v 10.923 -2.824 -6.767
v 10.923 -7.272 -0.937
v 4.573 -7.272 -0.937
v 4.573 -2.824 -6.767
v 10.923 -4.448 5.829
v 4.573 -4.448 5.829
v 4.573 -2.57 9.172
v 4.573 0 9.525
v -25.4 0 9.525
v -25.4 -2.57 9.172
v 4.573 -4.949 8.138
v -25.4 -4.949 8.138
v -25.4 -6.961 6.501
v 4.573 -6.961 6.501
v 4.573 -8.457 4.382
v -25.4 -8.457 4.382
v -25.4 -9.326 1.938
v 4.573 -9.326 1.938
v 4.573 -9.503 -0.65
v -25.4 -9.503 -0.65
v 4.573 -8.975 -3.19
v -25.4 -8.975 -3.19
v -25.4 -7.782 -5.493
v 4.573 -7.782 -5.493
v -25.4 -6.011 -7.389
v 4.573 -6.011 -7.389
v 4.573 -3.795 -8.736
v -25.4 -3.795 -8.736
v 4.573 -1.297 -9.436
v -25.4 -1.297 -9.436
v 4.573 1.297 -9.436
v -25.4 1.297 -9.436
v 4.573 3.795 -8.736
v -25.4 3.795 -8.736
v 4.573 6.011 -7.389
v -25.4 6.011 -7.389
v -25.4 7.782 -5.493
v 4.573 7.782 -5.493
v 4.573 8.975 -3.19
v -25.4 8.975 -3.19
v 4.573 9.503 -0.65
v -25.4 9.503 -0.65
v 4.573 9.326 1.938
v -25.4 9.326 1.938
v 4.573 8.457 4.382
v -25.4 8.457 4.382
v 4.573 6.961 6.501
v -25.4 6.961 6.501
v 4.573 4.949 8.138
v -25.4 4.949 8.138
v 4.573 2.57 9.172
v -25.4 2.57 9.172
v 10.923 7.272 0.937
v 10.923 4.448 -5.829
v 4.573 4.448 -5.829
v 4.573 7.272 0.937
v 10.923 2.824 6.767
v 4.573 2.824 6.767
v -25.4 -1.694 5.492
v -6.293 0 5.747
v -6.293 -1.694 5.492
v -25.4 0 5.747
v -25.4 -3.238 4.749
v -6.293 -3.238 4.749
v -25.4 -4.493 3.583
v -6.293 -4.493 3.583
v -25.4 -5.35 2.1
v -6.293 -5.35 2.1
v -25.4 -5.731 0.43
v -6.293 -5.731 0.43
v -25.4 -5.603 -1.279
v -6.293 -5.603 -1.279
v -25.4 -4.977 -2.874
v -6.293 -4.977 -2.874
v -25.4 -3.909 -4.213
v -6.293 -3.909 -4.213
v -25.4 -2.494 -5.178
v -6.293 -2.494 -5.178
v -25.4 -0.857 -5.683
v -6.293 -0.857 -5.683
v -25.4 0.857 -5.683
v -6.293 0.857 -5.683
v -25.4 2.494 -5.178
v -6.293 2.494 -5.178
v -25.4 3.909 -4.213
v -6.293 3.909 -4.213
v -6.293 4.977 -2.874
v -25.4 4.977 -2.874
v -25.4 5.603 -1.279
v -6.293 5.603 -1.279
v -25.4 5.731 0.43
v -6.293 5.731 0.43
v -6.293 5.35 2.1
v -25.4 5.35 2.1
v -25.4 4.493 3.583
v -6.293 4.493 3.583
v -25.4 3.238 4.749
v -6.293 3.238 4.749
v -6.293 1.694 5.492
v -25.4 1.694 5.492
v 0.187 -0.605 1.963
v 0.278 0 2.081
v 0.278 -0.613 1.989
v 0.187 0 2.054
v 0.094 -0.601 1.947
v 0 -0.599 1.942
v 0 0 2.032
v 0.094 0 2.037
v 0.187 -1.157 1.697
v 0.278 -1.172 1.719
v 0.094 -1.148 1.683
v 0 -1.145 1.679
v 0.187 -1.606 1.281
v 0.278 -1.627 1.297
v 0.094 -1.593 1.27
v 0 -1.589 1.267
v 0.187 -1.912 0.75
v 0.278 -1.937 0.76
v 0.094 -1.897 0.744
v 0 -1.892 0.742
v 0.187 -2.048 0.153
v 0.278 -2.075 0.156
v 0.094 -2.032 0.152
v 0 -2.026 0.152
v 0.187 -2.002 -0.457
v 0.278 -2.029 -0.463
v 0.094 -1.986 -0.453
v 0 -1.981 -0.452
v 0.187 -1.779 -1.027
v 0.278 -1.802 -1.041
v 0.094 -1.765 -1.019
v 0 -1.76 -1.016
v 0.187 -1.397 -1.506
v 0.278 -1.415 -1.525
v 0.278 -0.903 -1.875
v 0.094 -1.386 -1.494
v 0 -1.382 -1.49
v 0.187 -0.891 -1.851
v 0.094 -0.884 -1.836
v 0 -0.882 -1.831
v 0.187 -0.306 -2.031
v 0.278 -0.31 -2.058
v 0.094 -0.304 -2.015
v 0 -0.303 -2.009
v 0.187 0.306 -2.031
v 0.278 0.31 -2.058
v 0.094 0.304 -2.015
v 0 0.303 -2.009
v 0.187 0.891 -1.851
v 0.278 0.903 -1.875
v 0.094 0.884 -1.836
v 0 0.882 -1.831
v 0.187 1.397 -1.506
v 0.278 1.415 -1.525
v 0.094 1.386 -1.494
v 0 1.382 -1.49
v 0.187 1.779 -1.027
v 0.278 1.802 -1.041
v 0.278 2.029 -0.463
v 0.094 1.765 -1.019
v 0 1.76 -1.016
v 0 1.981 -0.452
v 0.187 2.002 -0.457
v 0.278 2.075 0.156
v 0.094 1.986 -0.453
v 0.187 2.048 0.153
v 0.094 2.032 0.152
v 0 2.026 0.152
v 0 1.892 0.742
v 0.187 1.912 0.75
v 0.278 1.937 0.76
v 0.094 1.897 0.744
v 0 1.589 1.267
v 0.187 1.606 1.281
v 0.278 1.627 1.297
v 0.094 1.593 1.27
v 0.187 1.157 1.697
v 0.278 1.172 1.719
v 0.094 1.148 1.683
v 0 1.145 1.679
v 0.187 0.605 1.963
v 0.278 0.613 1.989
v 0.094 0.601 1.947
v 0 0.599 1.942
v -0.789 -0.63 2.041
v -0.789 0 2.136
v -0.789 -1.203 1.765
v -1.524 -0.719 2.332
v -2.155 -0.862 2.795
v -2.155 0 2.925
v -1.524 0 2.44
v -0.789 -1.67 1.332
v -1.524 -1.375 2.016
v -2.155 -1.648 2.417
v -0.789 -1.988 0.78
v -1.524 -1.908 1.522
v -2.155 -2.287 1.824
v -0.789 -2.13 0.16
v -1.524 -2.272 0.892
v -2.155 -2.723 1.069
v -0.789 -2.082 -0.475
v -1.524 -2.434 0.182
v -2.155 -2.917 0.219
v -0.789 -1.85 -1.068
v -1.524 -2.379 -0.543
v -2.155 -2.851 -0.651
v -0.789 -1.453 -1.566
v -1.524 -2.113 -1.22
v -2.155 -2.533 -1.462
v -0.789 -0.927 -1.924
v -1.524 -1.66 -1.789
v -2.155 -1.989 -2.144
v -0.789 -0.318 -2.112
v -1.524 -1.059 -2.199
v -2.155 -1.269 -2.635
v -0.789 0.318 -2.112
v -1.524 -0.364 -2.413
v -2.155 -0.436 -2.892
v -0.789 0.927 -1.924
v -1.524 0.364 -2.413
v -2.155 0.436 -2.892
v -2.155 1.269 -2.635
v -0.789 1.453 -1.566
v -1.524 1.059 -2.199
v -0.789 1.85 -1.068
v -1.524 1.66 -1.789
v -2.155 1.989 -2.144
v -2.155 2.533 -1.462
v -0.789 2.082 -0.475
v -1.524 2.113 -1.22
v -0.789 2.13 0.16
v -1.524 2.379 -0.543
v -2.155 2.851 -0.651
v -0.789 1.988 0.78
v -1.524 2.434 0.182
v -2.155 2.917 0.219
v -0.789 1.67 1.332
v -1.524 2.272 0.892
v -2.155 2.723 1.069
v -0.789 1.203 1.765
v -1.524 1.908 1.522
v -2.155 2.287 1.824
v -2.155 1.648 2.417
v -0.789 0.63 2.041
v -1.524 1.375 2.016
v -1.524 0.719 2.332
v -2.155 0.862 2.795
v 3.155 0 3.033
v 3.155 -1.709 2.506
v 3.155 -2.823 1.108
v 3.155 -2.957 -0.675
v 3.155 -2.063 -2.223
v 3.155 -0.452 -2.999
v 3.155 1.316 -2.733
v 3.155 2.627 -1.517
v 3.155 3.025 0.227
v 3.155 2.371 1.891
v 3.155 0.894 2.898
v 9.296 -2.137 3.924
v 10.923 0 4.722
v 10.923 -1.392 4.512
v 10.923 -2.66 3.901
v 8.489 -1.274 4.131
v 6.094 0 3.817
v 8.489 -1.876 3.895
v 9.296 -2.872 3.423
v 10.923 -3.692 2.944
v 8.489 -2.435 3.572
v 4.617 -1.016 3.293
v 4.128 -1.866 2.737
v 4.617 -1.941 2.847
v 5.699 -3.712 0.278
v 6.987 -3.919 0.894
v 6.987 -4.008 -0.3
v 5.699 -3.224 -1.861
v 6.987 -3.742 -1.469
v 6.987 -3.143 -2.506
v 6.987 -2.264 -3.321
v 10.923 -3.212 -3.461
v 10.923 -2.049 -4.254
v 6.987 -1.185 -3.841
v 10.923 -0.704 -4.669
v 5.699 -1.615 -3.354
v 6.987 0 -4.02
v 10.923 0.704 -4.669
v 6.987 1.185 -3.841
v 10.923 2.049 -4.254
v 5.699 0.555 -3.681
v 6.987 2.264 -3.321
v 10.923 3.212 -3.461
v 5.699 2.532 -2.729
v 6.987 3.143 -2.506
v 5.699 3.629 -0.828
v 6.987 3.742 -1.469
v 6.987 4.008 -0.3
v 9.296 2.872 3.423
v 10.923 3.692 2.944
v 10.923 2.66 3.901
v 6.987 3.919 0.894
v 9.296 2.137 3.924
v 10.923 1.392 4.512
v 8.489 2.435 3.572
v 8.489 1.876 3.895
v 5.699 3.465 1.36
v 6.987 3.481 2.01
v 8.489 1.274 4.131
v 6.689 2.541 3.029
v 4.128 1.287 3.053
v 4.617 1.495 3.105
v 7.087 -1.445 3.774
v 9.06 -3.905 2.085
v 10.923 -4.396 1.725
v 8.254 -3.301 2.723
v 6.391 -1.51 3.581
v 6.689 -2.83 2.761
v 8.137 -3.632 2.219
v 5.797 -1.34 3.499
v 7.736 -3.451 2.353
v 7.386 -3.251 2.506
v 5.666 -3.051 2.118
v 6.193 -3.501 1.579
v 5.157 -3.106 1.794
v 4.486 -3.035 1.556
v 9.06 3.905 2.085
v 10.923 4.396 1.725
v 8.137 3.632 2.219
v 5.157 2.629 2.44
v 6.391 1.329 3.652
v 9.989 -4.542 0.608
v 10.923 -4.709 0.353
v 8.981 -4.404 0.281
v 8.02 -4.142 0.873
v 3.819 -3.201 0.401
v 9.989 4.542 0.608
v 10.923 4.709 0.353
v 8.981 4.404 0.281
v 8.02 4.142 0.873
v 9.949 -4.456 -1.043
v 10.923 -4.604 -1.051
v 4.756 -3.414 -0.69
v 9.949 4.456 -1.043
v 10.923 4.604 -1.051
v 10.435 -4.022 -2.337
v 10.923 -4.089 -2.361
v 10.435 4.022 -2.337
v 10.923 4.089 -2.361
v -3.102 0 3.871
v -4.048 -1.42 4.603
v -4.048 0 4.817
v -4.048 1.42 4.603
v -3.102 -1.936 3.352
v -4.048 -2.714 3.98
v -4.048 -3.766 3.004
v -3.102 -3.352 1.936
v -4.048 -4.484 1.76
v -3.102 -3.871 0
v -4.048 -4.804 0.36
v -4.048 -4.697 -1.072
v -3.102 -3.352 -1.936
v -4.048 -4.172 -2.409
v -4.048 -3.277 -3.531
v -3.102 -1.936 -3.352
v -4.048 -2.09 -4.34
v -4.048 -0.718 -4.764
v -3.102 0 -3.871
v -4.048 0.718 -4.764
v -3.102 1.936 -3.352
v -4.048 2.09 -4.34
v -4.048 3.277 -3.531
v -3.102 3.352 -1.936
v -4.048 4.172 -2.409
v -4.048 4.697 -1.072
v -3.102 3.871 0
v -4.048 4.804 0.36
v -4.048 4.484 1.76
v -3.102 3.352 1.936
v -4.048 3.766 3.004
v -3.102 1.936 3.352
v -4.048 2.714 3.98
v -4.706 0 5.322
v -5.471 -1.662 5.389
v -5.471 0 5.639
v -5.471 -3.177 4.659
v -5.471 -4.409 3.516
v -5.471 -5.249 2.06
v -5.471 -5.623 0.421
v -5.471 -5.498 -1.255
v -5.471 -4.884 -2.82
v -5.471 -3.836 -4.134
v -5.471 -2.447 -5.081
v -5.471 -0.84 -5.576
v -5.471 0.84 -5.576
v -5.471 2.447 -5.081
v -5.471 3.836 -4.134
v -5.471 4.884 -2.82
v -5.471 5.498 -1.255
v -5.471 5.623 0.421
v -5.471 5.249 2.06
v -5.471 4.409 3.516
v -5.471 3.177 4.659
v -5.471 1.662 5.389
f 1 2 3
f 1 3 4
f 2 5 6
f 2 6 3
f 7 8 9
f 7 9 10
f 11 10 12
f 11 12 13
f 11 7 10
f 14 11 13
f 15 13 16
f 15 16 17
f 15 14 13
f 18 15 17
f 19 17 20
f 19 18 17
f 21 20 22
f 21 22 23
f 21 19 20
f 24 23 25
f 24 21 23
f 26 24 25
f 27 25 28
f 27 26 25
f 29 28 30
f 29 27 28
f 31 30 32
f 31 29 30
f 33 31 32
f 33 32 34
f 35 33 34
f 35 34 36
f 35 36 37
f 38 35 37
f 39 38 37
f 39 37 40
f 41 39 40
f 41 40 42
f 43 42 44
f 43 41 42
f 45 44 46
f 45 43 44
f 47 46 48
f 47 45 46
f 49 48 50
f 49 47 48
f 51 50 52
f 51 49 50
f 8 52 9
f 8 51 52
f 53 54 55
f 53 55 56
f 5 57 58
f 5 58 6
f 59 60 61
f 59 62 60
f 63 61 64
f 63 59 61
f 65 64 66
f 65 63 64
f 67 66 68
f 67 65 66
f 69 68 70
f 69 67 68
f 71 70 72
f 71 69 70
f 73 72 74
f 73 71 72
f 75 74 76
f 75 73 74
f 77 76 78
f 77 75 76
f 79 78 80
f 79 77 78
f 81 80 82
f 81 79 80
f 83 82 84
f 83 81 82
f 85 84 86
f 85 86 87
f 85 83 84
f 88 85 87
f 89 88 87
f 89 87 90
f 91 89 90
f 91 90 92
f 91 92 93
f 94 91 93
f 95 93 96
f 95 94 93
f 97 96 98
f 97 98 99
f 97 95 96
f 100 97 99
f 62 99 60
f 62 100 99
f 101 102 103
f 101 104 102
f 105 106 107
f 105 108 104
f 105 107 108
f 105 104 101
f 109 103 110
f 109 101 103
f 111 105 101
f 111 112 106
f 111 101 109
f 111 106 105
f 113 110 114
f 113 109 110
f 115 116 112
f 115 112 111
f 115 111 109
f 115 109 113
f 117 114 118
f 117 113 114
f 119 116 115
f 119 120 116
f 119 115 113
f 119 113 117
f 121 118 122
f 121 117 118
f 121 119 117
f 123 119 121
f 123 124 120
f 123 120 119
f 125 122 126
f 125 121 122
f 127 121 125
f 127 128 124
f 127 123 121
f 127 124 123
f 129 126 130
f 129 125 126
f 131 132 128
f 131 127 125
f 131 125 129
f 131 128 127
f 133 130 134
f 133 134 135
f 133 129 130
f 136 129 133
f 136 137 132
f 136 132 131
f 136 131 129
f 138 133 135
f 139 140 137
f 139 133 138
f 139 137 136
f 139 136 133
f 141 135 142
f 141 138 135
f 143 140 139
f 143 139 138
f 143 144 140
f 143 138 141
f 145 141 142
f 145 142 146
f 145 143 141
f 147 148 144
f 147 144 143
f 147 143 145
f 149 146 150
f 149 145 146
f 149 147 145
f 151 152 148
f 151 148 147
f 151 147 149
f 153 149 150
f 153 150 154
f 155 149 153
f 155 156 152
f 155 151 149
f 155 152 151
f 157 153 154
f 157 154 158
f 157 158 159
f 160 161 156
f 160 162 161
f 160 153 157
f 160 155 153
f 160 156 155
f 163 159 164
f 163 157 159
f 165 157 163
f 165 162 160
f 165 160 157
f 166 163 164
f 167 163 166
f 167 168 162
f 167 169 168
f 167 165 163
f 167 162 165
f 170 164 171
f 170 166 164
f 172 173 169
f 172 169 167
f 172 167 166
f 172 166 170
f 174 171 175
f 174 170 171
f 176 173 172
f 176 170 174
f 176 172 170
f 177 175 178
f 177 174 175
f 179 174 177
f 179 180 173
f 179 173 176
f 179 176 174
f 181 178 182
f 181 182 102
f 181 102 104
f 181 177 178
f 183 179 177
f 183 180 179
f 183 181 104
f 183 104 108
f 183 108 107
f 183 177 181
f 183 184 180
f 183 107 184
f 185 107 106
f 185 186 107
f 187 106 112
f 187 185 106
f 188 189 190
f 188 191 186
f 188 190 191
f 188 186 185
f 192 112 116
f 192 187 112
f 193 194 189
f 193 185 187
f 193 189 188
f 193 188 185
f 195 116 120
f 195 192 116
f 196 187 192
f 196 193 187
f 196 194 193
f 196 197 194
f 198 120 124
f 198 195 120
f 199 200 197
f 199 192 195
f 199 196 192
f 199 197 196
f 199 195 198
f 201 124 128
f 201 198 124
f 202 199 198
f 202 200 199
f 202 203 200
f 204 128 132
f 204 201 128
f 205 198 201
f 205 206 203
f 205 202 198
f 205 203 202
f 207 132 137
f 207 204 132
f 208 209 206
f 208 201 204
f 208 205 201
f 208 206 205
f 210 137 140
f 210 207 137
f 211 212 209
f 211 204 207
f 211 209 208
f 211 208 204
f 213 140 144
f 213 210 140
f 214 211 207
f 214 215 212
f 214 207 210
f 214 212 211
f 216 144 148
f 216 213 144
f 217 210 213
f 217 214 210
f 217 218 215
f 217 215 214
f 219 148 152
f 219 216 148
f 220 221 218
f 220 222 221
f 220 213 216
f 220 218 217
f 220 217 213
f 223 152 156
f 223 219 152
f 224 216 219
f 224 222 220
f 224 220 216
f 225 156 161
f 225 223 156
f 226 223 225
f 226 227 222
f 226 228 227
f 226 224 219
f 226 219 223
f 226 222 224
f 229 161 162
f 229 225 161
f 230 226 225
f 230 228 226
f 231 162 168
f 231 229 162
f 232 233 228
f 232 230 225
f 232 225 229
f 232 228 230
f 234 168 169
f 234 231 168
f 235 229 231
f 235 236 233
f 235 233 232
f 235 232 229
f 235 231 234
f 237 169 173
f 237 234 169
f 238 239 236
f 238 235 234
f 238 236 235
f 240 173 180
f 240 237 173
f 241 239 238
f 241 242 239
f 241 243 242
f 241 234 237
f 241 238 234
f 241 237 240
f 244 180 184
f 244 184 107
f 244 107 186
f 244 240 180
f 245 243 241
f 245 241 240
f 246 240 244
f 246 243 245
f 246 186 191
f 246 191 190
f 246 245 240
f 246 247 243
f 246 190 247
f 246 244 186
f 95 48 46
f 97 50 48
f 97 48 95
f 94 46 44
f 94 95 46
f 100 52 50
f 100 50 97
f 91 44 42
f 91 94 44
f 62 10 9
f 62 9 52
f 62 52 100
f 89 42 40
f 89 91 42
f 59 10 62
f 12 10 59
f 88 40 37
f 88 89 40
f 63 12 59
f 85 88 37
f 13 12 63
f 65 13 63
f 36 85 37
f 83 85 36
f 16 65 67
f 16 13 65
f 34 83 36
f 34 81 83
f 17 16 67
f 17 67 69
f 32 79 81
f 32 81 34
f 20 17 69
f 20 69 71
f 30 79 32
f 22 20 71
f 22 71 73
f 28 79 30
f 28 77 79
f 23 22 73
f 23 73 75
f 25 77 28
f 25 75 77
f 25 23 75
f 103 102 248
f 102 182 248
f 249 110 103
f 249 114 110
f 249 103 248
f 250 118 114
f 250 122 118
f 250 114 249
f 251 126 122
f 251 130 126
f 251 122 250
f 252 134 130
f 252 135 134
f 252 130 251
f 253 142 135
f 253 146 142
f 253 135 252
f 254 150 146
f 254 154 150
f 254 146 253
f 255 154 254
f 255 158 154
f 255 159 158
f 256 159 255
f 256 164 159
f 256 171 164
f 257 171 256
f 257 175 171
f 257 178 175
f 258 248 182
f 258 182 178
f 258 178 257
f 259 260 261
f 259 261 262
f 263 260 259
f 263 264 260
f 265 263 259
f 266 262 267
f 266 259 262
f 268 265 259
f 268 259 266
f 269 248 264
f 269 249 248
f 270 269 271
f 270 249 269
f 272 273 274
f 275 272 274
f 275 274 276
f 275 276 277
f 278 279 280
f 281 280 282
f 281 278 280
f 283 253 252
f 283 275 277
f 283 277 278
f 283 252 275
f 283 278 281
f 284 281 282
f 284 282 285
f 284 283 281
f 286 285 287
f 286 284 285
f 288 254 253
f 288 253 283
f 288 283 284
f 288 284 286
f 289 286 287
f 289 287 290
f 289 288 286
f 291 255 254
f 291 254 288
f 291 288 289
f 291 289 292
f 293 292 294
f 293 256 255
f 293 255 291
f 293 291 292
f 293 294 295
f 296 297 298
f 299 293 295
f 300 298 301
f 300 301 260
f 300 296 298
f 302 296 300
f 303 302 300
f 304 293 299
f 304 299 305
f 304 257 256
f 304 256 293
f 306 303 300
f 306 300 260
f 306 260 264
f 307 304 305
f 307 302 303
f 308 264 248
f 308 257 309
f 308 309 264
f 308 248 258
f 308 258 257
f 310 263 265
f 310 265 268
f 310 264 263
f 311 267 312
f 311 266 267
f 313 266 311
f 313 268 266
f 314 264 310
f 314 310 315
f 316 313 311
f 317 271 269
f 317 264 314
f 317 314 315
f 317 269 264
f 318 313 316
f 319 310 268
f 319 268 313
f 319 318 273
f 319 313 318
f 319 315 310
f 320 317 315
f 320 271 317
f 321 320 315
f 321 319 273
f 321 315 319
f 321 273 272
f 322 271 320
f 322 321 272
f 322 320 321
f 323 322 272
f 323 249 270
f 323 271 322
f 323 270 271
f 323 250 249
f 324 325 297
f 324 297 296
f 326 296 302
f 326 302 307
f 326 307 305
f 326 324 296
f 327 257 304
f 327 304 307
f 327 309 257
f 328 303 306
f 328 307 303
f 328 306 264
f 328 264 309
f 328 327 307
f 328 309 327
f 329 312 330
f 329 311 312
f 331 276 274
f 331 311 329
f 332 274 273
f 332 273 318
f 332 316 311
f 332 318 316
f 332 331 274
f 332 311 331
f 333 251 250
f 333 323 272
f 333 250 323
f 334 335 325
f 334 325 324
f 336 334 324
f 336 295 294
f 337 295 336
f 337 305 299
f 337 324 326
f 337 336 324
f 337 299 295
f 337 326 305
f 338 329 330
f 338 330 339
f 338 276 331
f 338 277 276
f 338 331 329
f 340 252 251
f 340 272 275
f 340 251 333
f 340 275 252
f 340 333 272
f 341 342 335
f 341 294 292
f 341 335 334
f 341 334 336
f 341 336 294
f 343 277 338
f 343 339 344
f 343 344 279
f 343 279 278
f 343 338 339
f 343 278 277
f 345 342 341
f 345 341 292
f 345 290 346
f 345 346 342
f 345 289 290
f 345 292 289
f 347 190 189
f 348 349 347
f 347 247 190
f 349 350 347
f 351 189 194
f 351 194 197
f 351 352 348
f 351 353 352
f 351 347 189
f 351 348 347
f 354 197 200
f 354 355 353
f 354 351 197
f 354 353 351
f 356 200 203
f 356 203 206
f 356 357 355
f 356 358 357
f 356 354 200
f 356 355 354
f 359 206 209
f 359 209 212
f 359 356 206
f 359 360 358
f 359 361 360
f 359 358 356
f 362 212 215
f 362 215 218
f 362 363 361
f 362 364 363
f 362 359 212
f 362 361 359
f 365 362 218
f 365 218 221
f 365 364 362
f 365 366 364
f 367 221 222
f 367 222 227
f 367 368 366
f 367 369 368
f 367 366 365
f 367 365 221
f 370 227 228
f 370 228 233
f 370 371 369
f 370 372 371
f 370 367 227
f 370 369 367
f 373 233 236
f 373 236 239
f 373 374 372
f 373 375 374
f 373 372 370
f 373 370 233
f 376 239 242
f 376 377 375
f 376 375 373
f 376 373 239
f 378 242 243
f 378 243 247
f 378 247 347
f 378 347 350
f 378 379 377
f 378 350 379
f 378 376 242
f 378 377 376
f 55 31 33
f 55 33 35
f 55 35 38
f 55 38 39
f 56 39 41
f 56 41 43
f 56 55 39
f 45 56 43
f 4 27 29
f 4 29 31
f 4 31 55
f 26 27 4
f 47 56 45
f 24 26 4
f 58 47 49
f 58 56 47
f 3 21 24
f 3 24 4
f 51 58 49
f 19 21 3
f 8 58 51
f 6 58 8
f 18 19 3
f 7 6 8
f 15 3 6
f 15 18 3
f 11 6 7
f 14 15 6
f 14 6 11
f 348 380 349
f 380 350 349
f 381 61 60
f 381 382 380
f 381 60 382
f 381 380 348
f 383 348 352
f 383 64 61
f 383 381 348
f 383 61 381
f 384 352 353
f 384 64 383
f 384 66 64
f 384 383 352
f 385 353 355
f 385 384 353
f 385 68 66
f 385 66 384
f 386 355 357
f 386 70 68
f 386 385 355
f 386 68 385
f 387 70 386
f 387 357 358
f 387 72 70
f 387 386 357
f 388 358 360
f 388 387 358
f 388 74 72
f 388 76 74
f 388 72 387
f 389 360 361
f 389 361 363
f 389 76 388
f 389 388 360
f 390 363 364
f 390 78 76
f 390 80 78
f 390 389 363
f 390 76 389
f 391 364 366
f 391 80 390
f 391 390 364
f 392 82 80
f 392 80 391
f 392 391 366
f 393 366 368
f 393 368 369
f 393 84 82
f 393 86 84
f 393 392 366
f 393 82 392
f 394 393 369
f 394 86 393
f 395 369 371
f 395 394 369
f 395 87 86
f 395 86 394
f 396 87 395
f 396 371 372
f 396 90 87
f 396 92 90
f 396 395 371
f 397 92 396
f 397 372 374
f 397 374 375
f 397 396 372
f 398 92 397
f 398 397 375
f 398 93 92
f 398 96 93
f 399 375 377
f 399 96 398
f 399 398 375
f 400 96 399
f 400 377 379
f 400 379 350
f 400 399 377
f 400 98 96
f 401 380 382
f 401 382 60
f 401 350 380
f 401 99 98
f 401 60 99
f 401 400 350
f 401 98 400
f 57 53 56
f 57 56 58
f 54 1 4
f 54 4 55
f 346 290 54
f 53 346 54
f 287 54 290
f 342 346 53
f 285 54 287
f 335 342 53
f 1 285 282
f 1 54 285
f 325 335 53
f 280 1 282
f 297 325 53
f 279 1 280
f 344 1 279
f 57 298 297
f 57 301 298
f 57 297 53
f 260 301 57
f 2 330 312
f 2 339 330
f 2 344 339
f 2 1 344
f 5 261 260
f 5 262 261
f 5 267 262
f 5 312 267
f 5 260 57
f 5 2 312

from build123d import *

# Parameters (mm, degrees)
SKETCH3_R          = 9.525
CUT_EXTRUDE2_DEPTH = 6.35


with BuildPart() as part:
    # Sketch1 → Revolve1 (revolve)
    with BuildSketch(Plane.XY, mode=Mode.PRIVATE) as revolve1_sk:
        with BuildLine():
            Line((-2.155261469, 2.924738531), (-4.047950886, 4.817427948))
            ThreePointArc((-4.047950886, 4.817427948), (-5.077995018, 5.505681433), (-6.293014916, 5.747363917))
            Line((-6.293014916, 5.747363917), (-25.4, 5.747363917))
            Line((-25.4, 5.747363917), (-25.4, 9.525))
            Line((-25.4, 9.525), (-1.777203317, 9.525))
            Line((-1.777203317, 9.525), (10.922796683, 9.525))
            Line((10.922796683, 9.525), (10.922796683, 4.721941296))
            add(Edge.make_bspline(
                [(10.922796683, 4.721941296), (5.402180861, 3.94606934), (0.277993972, 2.081017838)],
                knots=[0, 0, 0, 1, 1, 1], degree=2))
            ThreePointArc((0.277993972, 2.081017838), (0.141141239, 2.044348258), (0, 2.032))
            ThreePointArc((0, 2.032), (-1.166419102, 2.264015185), (-2.155261469, 2.924738531))
        make_face()
    revolve(revolve1_sk.sketch.rotate(Axis((0, 0, 0), (1, 0, 0)), 90), axis=Axis((0, 0, 0), (1, 0, 0)))

    # Sketch3 → Cut-Extrude2 (cut)
    with BuildSketch(Plane(origin=(10.922796683, 0, 0), x_dir=(0, 0, -1), z_dir=(1, 0, 0))):
        with Locations(Location((0, 0, 0), (0, 0, 180))):
            Circle(SKETCH3_R)
        Polygon((-5.829170486, -4.447932641), (0.937437419, -7.272176044), (6.766607905, -2.824243403), (5.829170486, 4.447932641), (-0.937437419, 7.272176044), (-6.766607905, 2.824243403), align=None, mode=Mode.SUBTRACT)
    extrude(amount=-CUT_EXTRUDE2_DEPTH, mode=Mode.SUBTRACT)


solid = part.part
